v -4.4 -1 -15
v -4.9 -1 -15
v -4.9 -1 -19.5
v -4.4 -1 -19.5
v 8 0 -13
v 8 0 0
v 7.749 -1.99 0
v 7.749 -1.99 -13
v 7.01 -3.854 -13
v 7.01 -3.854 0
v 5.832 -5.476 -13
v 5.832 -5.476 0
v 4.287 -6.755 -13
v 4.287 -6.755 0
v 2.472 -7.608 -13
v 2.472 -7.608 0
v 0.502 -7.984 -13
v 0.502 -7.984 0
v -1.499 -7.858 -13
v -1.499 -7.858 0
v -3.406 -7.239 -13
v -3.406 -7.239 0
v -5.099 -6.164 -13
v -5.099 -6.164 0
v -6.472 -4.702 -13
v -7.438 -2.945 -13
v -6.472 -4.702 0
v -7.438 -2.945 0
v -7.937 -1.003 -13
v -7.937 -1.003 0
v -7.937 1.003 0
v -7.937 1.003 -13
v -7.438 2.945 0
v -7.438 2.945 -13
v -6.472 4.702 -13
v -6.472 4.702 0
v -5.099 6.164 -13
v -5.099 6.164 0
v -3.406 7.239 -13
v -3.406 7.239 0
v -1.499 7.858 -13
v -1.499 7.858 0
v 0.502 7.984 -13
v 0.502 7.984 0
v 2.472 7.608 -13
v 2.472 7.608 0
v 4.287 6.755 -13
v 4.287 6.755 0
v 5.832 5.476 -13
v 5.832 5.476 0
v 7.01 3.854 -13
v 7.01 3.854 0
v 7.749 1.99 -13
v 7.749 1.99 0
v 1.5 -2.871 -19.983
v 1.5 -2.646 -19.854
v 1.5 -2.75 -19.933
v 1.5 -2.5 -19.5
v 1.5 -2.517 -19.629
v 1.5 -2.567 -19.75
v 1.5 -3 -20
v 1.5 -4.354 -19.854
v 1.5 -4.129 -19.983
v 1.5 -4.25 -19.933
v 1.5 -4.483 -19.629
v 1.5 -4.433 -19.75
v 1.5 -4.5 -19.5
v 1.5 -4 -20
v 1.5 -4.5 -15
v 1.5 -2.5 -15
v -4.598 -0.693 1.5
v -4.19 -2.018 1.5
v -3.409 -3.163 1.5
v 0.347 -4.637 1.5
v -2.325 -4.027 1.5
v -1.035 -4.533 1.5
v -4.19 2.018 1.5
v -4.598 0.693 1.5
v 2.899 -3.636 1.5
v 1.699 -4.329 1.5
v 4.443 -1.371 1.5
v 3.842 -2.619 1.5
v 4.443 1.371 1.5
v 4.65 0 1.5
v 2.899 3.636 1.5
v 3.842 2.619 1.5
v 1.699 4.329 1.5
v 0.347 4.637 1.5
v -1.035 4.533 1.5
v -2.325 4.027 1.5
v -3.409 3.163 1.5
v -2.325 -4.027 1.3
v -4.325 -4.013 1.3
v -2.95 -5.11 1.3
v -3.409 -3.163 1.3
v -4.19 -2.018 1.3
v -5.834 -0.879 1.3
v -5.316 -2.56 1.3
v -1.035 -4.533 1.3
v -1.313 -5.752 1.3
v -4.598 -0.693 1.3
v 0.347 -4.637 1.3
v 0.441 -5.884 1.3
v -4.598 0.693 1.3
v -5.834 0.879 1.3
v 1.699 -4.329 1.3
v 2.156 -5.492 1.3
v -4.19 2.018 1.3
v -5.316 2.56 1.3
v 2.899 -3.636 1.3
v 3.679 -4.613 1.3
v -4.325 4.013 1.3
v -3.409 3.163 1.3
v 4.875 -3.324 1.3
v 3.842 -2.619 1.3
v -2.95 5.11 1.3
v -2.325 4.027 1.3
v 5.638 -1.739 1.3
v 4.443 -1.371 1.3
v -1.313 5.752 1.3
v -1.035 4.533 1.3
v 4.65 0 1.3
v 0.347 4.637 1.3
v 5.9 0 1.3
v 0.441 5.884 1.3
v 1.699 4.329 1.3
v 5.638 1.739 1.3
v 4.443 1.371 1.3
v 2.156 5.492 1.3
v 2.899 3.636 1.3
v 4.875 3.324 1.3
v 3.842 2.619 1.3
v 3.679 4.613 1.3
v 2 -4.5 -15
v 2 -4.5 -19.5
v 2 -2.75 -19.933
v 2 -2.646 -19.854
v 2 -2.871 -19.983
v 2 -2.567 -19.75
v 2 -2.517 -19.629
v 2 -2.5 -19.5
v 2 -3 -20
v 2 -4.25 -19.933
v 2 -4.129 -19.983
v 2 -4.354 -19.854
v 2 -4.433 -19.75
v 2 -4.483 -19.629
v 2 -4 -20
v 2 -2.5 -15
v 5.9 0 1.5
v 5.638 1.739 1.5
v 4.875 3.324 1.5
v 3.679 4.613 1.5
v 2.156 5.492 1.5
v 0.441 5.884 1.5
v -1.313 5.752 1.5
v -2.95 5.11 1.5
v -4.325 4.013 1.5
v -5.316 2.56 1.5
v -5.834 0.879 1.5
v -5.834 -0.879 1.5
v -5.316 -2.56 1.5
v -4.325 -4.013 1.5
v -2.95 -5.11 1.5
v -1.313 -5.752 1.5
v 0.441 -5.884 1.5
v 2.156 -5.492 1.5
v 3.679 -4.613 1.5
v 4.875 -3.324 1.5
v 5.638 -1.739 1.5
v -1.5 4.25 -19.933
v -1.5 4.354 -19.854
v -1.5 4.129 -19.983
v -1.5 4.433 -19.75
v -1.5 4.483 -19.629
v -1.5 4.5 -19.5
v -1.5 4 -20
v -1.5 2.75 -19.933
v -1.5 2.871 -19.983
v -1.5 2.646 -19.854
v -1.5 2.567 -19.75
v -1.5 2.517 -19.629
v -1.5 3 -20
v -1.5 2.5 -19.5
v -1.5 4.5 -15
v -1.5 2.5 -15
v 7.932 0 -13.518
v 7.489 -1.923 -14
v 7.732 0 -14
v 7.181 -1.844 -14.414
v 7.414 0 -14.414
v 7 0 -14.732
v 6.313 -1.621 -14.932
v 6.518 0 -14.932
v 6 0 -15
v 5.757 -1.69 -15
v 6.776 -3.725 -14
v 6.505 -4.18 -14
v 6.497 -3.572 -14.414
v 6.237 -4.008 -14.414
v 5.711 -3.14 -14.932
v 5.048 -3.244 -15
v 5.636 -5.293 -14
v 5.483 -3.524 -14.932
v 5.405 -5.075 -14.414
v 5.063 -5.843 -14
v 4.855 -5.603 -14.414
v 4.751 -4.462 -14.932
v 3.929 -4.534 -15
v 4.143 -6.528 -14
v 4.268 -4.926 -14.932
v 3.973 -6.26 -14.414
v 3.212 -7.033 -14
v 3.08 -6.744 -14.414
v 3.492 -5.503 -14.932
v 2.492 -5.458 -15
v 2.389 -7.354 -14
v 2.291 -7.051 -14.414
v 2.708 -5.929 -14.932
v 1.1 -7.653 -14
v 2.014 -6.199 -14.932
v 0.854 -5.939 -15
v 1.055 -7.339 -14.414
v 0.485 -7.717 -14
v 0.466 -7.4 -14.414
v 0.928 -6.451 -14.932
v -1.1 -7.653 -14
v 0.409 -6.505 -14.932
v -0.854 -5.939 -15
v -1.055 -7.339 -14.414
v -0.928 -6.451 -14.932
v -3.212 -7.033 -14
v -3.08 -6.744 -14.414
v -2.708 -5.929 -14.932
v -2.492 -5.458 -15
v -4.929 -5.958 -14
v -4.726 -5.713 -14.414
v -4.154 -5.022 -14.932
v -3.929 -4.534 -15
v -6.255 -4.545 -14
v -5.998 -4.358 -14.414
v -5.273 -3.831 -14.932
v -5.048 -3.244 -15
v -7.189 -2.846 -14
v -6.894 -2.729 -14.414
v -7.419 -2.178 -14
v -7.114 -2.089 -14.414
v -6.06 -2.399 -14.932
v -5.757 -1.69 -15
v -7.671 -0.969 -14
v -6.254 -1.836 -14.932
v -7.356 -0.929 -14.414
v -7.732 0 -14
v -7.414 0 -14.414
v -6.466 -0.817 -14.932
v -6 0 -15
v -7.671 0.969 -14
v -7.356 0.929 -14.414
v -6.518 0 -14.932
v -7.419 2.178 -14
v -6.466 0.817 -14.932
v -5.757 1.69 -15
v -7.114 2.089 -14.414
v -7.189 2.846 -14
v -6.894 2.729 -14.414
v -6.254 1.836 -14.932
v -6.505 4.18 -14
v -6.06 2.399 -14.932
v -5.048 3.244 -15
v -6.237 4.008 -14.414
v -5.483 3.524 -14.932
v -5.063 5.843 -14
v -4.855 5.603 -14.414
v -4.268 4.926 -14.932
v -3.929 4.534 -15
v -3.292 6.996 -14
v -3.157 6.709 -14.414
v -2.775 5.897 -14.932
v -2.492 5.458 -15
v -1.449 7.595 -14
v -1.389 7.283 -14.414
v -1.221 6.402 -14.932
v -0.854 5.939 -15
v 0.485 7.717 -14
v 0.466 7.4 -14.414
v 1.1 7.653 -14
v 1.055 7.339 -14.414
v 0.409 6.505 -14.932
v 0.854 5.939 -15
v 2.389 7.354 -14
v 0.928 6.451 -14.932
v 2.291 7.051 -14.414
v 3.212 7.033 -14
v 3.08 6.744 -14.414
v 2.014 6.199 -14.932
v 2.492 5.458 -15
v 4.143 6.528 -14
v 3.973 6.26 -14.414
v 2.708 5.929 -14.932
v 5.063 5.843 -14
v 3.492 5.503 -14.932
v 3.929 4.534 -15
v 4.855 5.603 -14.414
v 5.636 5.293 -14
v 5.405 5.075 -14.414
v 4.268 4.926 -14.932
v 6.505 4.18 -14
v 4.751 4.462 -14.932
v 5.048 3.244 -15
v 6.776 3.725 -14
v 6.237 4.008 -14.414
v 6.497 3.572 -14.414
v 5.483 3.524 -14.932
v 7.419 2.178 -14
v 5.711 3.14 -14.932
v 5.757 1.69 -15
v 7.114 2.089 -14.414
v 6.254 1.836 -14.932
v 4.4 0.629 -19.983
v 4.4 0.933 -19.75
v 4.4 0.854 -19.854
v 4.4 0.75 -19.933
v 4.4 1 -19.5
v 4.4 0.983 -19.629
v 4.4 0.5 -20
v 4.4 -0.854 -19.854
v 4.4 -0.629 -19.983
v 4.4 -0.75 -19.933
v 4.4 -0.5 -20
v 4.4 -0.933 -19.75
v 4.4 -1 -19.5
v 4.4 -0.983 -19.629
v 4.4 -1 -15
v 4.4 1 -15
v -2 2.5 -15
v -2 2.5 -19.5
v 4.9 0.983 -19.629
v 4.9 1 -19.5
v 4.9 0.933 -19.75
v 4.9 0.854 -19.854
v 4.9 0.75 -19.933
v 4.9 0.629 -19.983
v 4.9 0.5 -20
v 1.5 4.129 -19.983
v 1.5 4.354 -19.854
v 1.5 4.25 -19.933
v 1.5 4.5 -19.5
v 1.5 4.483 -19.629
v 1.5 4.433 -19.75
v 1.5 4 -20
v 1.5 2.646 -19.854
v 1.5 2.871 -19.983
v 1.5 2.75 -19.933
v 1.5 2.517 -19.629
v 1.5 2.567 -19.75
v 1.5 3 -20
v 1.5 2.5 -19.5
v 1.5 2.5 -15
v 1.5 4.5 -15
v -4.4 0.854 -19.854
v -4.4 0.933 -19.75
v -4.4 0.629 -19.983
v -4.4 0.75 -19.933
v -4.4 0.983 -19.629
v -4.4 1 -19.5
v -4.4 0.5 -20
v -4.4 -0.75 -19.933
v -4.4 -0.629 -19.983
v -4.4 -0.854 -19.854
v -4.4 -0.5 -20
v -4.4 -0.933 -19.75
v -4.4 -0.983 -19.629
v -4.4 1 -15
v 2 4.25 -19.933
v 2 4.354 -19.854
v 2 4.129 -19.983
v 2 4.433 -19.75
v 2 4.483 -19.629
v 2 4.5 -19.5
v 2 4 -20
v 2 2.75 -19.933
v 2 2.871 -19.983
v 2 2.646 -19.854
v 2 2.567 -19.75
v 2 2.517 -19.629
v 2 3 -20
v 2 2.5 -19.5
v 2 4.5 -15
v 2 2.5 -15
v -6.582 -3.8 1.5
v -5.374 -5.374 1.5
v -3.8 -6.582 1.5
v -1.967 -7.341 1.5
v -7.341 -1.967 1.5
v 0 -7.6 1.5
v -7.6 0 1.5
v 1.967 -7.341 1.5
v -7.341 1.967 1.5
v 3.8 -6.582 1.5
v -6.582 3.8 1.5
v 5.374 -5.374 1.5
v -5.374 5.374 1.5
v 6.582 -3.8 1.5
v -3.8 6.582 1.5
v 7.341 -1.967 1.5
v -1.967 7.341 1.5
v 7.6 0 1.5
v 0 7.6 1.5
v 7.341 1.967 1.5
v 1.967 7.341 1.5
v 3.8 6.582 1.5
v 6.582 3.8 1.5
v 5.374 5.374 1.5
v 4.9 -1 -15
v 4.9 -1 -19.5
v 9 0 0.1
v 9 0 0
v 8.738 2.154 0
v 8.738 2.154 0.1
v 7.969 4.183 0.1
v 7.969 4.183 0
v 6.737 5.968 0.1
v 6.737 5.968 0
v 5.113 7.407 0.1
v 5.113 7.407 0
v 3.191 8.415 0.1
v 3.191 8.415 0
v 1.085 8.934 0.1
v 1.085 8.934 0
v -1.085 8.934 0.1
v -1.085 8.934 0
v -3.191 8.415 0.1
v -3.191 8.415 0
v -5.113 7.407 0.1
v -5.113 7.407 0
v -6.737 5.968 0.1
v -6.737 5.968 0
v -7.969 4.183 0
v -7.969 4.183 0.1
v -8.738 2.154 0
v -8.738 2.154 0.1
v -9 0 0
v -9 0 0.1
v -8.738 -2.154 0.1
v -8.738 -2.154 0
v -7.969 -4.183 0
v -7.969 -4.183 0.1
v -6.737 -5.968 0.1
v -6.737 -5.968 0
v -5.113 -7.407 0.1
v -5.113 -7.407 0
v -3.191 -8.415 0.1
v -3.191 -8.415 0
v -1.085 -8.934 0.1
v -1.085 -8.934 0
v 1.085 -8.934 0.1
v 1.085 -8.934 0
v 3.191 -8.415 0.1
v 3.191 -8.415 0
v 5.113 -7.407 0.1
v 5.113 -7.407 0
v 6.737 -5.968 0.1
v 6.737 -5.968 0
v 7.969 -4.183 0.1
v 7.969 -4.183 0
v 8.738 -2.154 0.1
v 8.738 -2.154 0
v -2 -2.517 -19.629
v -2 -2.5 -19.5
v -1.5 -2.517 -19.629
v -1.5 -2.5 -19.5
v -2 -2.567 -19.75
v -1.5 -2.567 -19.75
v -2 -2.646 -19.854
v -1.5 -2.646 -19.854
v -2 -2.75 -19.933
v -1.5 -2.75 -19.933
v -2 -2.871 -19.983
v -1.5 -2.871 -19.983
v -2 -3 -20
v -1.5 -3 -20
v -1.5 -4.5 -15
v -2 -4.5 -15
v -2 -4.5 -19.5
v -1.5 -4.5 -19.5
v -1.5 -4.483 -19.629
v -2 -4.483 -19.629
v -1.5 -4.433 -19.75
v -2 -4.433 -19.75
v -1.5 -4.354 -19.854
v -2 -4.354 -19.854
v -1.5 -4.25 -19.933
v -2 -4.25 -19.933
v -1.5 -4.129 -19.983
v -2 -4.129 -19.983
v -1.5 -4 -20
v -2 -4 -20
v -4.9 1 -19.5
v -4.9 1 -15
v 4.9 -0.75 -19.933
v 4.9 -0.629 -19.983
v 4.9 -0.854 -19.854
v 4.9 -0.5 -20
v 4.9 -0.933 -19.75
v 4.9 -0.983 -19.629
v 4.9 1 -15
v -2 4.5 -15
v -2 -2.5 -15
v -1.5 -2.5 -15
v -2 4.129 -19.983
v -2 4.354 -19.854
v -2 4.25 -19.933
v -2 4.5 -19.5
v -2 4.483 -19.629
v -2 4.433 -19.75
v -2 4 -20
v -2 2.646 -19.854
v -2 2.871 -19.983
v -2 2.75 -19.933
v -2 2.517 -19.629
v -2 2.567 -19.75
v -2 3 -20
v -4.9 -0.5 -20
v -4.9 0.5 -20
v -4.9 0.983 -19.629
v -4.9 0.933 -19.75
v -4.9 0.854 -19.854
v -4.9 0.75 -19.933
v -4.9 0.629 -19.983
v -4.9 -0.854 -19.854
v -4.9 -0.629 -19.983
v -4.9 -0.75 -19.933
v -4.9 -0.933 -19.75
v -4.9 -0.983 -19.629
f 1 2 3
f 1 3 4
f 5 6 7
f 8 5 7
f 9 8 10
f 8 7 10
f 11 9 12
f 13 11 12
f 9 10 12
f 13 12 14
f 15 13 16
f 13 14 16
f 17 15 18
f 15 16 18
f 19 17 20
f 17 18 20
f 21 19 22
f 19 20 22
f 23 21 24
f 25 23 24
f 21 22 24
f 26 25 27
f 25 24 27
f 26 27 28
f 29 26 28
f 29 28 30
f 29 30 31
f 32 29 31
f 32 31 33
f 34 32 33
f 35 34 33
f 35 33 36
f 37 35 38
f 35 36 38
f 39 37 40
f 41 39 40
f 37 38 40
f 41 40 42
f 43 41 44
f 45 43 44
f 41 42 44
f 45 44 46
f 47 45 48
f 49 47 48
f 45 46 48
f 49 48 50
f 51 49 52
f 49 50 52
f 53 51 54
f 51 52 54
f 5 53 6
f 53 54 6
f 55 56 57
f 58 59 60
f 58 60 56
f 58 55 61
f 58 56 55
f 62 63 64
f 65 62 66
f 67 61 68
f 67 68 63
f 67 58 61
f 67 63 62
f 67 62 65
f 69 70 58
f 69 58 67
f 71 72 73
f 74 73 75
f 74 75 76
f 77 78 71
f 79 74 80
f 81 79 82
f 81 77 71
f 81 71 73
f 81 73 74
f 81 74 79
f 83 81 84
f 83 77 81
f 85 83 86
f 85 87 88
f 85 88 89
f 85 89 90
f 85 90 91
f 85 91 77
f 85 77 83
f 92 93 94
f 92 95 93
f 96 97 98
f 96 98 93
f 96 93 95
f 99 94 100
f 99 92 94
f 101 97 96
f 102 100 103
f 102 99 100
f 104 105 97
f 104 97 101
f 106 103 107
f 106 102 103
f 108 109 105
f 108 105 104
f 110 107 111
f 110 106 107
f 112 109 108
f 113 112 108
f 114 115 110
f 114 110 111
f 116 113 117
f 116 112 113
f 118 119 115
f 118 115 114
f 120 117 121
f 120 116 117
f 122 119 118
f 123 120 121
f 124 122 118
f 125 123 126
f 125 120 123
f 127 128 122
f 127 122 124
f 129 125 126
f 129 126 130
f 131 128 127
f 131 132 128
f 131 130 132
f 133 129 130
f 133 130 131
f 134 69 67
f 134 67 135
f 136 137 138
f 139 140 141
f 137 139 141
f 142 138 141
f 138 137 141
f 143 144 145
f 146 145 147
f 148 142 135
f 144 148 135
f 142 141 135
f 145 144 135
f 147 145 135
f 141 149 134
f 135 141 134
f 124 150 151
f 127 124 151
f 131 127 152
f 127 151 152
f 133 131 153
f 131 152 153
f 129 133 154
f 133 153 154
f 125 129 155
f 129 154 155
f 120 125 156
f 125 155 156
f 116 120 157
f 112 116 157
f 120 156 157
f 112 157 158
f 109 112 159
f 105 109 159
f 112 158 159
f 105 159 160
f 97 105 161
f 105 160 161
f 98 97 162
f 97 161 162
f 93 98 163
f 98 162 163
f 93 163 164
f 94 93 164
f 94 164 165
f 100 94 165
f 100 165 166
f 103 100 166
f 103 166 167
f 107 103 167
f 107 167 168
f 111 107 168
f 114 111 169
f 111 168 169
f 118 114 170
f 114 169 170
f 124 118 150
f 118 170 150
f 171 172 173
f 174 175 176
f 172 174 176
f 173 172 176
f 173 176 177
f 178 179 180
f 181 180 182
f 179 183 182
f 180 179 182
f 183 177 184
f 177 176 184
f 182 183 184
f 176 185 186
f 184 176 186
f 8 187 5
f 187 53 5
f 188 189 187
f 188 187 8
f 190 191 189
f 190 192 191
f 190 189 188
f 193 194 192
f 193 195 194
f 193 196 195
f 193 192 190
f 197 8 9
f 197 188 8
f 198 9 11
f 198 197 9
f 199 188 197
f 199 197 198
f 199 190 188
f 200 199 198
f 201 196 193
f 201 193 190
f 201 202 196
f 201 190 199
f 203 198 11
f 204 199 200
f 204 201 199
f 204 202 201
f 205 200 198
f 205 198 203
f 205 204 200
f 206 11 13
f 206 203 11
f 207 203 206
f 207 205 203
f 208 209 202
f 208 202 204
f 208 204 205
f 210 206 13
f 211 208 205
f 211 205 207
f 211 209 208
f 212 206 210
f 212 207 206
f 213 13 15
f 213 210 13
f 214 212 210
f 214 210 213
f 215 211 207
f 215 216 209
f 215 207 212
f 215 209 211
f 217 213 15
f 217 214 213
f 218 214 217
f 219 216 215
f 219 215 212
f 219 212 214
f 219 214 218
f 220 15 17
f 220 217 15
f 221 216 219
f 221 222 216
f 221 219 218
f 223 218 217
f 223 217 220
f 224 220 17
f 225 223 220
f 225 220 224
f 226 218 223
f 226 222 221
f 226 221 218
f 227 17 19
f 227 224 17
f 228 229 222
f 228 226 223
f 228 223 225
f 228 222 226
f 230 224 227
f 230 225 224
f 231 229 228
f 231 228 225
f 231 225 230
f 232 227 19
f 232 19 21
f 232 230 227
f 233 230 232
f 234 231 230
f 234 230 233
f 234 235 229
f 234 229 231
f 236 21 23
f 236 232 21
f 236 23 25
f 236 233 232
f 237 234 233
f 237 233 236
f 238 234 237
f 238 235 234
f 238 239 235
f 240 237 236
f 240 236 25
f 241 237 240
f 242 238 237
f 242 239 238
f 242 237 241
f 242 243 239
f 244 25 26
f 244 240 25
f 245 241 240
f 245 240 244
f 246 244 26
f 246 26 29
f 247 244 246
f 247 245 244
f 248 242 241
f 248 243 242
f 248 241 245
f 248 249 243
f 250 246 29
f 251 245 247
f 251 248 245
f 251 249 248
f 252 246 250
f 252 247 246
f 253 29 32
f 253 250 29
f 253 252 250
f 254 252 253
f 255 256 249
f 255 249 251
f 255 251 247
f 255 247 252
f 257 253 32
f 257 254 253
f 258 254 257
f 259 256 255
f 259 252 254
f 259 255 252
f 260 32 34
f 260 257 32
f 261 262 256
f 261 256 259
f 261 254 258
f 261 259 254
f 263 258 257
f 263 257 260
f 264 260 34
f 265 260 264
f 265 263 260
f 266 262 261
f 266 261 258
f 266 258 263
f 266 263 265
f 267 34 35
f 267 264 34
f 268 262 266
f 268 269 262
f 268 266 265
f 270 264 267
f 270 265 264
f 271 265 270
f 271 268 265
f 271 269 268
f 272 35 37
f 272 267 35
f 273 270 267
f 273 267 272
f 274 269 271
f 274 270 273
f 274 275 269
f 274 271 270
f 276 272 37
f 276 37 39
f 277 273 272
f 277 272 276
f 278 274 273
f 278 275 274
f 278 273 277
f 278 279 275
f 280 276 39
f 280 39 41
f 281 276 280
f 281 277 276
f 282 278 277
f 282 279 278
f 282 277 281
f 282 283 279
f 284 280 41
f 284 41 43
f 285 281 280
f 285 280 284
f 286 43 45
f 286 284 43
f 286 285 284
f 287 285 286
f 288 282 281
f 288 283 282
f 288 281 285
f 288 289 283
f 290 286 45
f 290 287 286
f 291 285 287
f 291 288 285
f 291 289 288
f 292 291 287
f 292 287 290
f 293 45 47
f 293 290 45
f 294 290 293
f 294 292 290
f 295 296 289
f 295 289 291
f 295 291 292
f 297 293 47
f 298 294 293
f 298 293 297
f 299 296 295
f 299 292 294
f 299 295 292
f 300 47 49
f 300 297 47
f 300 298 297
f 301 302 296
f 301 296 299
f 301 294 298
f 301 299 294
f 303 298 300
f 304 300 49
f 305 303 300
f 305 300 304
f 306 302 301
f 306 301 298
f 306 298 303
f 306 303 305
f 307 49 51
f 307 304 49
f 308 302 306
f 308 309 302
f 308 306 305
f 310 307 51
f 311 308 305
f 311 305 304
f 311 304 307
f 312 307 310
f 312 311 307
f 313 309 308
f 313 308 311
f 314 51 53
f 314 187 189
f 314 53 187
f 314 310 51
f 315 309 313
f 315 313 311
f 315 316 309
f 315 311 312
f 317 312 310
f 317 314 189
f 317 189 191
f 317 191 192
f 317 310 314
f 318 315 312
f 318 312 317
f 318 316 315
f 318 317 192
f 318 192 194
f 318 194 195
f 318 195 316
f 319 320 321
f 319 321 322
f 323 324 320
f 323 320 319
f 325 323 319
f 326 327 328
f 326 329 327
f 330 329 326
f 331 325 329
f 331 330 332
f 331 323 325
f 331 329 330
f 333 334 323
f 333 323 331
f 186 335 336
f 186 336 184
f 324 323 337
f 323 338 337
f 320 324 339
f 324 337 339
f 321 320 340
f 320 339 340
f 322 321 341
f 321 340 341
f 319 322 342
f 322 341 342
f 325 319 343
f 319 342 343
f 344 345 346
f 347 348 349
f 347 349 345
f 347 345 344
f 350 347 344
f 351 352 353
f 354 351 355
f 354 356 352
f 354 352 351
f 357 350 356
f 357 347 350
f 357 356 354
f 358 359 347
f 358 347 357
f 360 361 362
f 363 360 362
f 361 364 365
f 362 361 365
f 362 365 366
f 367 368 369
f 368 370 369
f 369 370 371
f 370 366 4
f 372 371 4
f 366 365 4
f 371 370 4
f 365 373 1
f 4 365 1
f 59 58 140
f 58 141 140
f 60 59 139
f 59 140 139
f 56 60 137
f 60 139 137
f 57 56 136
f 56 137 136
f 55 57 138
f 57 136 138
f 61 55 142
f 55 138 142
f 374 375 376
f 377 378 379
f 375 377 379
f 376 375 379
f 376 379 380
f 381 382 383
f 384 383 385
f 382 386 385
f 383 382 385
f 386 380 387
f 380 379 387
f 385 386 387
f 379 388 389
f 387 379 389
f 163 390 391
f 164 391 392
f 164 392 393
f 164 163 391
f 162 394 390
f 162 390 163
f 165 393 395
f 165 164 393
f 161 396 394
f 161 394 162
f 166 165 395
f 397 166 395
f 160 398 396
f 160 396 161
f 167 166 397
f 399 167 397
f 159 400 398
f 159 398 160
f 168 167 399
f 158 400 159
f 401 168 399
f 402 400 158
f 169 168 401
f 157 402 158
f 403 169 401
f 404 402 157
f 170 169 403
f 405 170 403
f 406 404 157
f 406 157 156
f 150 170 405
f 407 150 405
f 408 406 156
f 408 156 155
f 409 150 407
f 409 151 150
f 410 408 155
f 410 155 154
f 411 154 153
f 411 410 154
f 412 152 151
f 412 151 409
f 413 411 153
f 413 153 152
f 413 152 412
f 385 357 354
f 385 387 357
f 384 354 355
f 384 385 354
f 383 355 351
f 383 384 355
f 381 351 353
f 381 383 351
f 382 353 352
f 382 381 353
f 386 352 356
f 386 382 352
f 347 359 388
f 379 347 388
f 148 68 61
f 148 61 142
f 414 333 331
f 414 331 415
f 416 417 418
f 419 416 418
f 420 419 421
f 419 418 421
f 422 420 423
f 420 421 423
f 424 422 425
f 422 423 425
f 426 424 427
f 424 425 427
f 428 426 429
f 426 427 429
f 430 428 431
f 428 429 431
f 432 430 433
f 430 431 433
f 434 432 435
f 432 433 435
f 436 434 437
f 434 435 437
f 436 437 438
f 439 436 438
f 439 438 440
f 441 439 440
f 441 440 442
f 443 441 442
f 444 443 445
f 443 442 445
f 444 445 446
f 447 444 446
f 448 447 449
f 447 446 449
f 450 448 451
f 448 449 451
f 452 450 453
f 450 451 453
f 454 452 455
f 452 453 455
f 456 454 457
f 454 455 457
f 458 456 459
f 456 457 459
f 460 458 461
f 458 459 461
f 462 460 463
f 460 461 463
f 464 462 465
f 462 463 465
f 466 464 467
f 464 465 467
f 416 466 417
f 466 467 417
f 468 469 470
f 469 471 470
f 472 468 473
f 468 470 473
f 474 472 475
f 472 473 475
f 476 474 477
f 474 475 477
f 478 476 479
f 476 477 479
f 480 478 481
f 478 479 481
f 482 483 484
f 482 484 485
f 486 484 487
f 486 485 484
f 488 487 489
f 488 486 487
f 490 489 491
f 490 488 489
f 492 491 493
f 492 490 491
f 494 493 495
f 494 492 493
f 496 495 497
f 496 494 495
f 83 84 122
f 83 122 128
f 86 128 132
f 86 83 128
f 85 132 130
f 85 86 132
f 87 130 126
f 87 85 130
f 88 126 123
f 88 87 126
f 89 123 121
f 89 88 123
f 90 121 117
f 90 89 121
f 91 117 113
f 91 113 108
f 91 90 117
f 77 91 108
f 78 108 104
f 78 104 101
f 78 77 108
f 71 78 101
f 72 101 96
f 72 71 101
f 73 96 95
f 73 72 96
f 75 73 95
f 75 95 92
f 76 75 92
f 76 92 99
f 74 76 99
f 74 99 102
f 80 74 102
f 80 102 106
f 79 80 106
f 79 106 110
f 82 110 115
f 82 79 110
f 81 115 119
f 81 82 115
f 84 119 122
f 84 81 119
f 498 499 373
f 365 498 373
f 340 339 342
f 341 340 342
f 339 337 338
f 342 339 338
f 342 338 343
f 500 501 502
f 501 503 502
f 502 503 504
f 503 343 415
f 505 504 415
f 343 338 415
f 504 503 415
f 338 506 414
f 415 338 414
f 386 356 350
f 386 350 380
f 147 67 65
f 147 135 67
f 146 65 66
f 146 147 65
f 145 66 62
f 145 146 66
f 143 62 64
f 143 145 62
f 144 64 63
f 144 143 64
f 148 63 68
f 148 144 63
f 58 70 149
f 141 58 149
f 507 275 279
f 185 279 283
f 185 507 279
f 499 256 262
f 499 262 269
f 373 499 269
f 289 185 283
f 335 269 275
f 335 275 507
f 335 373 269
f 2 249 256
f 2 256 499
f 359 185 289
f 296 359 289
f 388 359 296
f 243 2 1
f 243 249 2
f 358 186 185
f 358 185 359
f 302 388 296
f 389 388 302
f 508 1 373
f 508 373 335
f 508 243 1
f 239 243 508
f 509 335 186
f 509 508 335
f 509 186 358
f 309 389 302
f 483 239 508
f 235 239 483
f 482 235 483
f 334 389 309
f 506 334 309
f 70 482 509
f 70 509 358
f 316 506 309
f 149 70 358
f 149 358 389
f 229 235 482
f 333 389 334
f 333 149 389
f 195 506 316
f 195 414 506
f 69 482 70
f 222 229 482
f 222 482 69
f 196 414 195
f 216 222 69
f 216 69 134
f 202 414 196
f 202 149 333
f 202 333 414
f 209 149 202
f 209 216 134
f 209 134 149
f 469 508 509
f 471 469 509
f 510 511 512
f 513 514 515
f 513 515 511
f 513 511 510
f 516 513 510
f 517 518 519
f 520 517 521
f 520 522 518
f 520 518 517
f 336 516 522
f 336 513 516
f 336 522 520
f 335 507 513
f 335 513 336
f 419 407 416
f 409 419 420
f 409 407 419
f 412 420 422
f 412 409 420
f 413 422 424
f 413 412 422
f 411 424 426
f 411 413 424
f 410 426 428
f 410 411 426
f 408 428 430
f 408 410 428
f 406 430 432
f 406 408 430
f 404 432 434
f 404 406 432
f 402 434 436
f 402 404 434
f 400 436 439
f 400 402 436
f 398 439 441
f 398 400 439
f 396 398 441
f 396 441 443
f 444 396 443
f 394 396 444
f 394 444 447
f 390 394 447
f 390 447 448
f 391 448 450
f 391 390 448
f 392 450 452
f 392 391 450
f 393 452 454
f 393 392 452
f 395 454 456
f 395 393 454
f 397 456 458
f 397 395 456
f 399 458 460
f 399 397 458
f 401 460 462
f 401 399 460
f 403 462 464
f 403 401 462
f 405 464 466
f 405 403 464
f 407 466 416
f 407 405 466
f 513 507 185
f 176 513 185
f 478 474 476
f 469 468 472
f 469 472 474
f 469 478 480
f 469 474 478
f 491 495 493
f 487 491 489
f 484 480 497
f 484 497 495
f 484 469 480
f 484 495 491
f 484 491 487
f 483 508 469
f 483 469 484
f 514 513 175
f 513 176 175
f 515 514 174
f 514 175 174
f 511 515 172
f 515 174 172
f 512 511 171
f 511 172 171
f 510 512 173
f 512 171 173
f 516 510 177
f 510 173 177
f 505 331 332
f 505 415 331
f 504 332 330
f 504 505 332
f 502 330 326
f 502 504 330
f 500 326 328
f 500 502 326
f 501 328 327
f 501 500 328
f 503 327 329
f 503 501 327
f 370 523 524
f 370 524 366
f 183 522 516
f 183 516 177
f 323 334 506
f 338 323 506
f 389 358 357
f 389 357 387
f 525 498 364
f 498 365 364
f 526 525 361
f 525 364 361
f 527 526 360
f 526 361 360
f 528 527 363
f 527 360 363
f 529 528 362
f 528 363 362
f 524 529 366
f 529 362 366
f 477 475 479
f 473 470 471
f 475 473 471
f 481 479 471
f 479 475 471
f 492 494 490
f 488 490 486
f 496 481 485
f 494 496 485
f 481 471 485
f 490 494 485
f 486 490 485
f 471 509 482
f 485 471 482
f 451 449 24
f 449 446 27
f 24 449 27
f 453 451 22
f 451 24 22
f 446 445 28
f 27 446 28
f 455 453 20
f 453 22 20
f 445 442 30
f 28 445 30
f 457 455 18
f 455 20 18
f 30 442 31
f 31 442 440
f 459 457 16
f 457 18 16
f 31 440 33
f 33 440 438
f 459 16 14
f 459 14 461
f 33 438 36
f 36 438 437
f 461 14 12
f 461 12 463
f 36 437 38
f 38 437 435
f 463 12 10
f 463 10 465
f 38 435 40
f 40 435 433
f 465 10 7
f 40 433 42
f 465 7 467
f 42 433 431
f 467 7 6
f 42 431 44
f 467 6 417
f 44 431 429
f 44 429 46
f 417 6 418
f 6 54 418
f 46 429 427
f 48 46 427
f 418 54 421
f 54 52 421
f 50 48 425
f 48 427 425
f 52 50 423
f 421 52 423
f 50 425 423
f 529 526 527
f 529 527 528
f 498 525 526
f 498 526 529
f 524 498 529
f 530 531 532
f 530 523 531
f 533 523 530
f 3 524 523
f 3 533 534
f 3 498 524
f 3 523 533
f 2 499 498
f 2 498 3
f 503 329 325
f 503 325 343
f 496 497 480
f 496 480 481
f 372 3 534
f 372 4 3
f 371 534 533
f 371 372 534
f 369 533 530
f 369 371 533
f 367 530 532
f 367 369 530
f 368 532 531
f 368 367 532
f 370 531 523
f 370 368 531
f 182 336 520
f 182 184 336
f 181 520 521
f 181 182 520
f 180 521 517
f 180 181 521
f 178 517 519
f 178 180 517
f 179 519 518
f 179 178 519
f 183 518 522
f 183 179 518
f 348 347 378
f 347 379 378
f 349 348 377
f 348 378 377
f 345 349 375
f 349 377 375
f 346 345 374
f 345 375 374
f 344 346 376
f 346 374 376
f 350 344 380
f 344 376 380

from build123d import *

# Parameters (mm, degrees)
F0_R     = 9
F1_DEPTH = 1.5
F2_SIZE  = 1.4
F3_R     = 5.9
F3_R_2   = 4.65
F4_DEPTH = 0.2
F5_R     = 8
F6_DEPTH = 15
F7_R     = 2
F8_W     = 0.5
F8_H     = 2
F9_DEPTH = 5
F10_R    = 0.5


with BuildPart() as f1:
    # F0 (on Top) → F1 (new body)
    with BuildSketch(Plane.XY):
        Circle(F0_R)
    extrude(amount=F1_DEPTH)

    # F2
    f2_edges = [f1.edges().sort_by_distance(p)[0] for p in [
        (-9, 0, 1.5),
    ]]
    chamfer(f2_edges, length=F2_SIZE)

    # F3 (on face) → F4 (cut)
    with BuildSketch(Plane.XY.offset(1.5)):
        Circle(F3_R)
        Circle(F3_R_2, mode=Mode.SUBTRACT)
    extrude(amount=-F4_DEPTH, mode=Mode.SUBTRACT)

    # F5 (on face) → F6 (join)
    with BuildSketch(Plane(origin=(0, 0, 0), x_dir=(1, 0, 0), z_dir=(0, 0, -1))):
        Circle(F5_R)
    extrude(amount=F6_DEPTH)

    # F7
    f7_edges = [f1.edges().sort_by_distance(p)[0] for p in [
        (-8, 0, -15),
    ]]
    fillet(f7_edges, radius=F7_R)

    # F8 (on face) → F9 (join)
    with BuildSketch(Plane(origin=(0, 0, -15), x_dir=(1, 0, 0), z_dir=(0, 0, -1))):
        with Locations((-1.75, 3.5)):
            Rectangle(F8_W, F8_H)
        with Locations((1.75, 3.5)):
            Rectangle(F8_W, F8_H)
        with Locations((1.75, -3.5)):
            Rectangle(F8_W, F8_H)
        with Locations((-1.75, -3.5)):
            Rectangle(F8_W, F8_H)
        with Locations((-4.65, 0)):
            Rectangle(F8_W, F8_H)
        with Locations((4.65, 0)):
            Rectangle(F8_W, F8_H)
    extrude(amount=F9_DEPTH)

    # F10
    f10_edges = [f1.edges().sort_by_distance(p)[0] for p in [
        (-1.75, -4.5, -20),
        (1.75, -4.5, -20),
        (4.65, -1, -20),
        (-4.65, -1, -20),
        (1.75, 2.5, -20),
        (-1.75, 2.5, -20),
        (-4.65, 1, -20),
        (-1.75, -2.5, -20),
        (1.75, -2.5, -20),
        (4.65, 1, -20),
        (1.75, 4.5, -20),
        (-1.75, 4.5, -20),
    ]]
    fillet(f10_edges, radius=F10_R)


solid = f1.part
